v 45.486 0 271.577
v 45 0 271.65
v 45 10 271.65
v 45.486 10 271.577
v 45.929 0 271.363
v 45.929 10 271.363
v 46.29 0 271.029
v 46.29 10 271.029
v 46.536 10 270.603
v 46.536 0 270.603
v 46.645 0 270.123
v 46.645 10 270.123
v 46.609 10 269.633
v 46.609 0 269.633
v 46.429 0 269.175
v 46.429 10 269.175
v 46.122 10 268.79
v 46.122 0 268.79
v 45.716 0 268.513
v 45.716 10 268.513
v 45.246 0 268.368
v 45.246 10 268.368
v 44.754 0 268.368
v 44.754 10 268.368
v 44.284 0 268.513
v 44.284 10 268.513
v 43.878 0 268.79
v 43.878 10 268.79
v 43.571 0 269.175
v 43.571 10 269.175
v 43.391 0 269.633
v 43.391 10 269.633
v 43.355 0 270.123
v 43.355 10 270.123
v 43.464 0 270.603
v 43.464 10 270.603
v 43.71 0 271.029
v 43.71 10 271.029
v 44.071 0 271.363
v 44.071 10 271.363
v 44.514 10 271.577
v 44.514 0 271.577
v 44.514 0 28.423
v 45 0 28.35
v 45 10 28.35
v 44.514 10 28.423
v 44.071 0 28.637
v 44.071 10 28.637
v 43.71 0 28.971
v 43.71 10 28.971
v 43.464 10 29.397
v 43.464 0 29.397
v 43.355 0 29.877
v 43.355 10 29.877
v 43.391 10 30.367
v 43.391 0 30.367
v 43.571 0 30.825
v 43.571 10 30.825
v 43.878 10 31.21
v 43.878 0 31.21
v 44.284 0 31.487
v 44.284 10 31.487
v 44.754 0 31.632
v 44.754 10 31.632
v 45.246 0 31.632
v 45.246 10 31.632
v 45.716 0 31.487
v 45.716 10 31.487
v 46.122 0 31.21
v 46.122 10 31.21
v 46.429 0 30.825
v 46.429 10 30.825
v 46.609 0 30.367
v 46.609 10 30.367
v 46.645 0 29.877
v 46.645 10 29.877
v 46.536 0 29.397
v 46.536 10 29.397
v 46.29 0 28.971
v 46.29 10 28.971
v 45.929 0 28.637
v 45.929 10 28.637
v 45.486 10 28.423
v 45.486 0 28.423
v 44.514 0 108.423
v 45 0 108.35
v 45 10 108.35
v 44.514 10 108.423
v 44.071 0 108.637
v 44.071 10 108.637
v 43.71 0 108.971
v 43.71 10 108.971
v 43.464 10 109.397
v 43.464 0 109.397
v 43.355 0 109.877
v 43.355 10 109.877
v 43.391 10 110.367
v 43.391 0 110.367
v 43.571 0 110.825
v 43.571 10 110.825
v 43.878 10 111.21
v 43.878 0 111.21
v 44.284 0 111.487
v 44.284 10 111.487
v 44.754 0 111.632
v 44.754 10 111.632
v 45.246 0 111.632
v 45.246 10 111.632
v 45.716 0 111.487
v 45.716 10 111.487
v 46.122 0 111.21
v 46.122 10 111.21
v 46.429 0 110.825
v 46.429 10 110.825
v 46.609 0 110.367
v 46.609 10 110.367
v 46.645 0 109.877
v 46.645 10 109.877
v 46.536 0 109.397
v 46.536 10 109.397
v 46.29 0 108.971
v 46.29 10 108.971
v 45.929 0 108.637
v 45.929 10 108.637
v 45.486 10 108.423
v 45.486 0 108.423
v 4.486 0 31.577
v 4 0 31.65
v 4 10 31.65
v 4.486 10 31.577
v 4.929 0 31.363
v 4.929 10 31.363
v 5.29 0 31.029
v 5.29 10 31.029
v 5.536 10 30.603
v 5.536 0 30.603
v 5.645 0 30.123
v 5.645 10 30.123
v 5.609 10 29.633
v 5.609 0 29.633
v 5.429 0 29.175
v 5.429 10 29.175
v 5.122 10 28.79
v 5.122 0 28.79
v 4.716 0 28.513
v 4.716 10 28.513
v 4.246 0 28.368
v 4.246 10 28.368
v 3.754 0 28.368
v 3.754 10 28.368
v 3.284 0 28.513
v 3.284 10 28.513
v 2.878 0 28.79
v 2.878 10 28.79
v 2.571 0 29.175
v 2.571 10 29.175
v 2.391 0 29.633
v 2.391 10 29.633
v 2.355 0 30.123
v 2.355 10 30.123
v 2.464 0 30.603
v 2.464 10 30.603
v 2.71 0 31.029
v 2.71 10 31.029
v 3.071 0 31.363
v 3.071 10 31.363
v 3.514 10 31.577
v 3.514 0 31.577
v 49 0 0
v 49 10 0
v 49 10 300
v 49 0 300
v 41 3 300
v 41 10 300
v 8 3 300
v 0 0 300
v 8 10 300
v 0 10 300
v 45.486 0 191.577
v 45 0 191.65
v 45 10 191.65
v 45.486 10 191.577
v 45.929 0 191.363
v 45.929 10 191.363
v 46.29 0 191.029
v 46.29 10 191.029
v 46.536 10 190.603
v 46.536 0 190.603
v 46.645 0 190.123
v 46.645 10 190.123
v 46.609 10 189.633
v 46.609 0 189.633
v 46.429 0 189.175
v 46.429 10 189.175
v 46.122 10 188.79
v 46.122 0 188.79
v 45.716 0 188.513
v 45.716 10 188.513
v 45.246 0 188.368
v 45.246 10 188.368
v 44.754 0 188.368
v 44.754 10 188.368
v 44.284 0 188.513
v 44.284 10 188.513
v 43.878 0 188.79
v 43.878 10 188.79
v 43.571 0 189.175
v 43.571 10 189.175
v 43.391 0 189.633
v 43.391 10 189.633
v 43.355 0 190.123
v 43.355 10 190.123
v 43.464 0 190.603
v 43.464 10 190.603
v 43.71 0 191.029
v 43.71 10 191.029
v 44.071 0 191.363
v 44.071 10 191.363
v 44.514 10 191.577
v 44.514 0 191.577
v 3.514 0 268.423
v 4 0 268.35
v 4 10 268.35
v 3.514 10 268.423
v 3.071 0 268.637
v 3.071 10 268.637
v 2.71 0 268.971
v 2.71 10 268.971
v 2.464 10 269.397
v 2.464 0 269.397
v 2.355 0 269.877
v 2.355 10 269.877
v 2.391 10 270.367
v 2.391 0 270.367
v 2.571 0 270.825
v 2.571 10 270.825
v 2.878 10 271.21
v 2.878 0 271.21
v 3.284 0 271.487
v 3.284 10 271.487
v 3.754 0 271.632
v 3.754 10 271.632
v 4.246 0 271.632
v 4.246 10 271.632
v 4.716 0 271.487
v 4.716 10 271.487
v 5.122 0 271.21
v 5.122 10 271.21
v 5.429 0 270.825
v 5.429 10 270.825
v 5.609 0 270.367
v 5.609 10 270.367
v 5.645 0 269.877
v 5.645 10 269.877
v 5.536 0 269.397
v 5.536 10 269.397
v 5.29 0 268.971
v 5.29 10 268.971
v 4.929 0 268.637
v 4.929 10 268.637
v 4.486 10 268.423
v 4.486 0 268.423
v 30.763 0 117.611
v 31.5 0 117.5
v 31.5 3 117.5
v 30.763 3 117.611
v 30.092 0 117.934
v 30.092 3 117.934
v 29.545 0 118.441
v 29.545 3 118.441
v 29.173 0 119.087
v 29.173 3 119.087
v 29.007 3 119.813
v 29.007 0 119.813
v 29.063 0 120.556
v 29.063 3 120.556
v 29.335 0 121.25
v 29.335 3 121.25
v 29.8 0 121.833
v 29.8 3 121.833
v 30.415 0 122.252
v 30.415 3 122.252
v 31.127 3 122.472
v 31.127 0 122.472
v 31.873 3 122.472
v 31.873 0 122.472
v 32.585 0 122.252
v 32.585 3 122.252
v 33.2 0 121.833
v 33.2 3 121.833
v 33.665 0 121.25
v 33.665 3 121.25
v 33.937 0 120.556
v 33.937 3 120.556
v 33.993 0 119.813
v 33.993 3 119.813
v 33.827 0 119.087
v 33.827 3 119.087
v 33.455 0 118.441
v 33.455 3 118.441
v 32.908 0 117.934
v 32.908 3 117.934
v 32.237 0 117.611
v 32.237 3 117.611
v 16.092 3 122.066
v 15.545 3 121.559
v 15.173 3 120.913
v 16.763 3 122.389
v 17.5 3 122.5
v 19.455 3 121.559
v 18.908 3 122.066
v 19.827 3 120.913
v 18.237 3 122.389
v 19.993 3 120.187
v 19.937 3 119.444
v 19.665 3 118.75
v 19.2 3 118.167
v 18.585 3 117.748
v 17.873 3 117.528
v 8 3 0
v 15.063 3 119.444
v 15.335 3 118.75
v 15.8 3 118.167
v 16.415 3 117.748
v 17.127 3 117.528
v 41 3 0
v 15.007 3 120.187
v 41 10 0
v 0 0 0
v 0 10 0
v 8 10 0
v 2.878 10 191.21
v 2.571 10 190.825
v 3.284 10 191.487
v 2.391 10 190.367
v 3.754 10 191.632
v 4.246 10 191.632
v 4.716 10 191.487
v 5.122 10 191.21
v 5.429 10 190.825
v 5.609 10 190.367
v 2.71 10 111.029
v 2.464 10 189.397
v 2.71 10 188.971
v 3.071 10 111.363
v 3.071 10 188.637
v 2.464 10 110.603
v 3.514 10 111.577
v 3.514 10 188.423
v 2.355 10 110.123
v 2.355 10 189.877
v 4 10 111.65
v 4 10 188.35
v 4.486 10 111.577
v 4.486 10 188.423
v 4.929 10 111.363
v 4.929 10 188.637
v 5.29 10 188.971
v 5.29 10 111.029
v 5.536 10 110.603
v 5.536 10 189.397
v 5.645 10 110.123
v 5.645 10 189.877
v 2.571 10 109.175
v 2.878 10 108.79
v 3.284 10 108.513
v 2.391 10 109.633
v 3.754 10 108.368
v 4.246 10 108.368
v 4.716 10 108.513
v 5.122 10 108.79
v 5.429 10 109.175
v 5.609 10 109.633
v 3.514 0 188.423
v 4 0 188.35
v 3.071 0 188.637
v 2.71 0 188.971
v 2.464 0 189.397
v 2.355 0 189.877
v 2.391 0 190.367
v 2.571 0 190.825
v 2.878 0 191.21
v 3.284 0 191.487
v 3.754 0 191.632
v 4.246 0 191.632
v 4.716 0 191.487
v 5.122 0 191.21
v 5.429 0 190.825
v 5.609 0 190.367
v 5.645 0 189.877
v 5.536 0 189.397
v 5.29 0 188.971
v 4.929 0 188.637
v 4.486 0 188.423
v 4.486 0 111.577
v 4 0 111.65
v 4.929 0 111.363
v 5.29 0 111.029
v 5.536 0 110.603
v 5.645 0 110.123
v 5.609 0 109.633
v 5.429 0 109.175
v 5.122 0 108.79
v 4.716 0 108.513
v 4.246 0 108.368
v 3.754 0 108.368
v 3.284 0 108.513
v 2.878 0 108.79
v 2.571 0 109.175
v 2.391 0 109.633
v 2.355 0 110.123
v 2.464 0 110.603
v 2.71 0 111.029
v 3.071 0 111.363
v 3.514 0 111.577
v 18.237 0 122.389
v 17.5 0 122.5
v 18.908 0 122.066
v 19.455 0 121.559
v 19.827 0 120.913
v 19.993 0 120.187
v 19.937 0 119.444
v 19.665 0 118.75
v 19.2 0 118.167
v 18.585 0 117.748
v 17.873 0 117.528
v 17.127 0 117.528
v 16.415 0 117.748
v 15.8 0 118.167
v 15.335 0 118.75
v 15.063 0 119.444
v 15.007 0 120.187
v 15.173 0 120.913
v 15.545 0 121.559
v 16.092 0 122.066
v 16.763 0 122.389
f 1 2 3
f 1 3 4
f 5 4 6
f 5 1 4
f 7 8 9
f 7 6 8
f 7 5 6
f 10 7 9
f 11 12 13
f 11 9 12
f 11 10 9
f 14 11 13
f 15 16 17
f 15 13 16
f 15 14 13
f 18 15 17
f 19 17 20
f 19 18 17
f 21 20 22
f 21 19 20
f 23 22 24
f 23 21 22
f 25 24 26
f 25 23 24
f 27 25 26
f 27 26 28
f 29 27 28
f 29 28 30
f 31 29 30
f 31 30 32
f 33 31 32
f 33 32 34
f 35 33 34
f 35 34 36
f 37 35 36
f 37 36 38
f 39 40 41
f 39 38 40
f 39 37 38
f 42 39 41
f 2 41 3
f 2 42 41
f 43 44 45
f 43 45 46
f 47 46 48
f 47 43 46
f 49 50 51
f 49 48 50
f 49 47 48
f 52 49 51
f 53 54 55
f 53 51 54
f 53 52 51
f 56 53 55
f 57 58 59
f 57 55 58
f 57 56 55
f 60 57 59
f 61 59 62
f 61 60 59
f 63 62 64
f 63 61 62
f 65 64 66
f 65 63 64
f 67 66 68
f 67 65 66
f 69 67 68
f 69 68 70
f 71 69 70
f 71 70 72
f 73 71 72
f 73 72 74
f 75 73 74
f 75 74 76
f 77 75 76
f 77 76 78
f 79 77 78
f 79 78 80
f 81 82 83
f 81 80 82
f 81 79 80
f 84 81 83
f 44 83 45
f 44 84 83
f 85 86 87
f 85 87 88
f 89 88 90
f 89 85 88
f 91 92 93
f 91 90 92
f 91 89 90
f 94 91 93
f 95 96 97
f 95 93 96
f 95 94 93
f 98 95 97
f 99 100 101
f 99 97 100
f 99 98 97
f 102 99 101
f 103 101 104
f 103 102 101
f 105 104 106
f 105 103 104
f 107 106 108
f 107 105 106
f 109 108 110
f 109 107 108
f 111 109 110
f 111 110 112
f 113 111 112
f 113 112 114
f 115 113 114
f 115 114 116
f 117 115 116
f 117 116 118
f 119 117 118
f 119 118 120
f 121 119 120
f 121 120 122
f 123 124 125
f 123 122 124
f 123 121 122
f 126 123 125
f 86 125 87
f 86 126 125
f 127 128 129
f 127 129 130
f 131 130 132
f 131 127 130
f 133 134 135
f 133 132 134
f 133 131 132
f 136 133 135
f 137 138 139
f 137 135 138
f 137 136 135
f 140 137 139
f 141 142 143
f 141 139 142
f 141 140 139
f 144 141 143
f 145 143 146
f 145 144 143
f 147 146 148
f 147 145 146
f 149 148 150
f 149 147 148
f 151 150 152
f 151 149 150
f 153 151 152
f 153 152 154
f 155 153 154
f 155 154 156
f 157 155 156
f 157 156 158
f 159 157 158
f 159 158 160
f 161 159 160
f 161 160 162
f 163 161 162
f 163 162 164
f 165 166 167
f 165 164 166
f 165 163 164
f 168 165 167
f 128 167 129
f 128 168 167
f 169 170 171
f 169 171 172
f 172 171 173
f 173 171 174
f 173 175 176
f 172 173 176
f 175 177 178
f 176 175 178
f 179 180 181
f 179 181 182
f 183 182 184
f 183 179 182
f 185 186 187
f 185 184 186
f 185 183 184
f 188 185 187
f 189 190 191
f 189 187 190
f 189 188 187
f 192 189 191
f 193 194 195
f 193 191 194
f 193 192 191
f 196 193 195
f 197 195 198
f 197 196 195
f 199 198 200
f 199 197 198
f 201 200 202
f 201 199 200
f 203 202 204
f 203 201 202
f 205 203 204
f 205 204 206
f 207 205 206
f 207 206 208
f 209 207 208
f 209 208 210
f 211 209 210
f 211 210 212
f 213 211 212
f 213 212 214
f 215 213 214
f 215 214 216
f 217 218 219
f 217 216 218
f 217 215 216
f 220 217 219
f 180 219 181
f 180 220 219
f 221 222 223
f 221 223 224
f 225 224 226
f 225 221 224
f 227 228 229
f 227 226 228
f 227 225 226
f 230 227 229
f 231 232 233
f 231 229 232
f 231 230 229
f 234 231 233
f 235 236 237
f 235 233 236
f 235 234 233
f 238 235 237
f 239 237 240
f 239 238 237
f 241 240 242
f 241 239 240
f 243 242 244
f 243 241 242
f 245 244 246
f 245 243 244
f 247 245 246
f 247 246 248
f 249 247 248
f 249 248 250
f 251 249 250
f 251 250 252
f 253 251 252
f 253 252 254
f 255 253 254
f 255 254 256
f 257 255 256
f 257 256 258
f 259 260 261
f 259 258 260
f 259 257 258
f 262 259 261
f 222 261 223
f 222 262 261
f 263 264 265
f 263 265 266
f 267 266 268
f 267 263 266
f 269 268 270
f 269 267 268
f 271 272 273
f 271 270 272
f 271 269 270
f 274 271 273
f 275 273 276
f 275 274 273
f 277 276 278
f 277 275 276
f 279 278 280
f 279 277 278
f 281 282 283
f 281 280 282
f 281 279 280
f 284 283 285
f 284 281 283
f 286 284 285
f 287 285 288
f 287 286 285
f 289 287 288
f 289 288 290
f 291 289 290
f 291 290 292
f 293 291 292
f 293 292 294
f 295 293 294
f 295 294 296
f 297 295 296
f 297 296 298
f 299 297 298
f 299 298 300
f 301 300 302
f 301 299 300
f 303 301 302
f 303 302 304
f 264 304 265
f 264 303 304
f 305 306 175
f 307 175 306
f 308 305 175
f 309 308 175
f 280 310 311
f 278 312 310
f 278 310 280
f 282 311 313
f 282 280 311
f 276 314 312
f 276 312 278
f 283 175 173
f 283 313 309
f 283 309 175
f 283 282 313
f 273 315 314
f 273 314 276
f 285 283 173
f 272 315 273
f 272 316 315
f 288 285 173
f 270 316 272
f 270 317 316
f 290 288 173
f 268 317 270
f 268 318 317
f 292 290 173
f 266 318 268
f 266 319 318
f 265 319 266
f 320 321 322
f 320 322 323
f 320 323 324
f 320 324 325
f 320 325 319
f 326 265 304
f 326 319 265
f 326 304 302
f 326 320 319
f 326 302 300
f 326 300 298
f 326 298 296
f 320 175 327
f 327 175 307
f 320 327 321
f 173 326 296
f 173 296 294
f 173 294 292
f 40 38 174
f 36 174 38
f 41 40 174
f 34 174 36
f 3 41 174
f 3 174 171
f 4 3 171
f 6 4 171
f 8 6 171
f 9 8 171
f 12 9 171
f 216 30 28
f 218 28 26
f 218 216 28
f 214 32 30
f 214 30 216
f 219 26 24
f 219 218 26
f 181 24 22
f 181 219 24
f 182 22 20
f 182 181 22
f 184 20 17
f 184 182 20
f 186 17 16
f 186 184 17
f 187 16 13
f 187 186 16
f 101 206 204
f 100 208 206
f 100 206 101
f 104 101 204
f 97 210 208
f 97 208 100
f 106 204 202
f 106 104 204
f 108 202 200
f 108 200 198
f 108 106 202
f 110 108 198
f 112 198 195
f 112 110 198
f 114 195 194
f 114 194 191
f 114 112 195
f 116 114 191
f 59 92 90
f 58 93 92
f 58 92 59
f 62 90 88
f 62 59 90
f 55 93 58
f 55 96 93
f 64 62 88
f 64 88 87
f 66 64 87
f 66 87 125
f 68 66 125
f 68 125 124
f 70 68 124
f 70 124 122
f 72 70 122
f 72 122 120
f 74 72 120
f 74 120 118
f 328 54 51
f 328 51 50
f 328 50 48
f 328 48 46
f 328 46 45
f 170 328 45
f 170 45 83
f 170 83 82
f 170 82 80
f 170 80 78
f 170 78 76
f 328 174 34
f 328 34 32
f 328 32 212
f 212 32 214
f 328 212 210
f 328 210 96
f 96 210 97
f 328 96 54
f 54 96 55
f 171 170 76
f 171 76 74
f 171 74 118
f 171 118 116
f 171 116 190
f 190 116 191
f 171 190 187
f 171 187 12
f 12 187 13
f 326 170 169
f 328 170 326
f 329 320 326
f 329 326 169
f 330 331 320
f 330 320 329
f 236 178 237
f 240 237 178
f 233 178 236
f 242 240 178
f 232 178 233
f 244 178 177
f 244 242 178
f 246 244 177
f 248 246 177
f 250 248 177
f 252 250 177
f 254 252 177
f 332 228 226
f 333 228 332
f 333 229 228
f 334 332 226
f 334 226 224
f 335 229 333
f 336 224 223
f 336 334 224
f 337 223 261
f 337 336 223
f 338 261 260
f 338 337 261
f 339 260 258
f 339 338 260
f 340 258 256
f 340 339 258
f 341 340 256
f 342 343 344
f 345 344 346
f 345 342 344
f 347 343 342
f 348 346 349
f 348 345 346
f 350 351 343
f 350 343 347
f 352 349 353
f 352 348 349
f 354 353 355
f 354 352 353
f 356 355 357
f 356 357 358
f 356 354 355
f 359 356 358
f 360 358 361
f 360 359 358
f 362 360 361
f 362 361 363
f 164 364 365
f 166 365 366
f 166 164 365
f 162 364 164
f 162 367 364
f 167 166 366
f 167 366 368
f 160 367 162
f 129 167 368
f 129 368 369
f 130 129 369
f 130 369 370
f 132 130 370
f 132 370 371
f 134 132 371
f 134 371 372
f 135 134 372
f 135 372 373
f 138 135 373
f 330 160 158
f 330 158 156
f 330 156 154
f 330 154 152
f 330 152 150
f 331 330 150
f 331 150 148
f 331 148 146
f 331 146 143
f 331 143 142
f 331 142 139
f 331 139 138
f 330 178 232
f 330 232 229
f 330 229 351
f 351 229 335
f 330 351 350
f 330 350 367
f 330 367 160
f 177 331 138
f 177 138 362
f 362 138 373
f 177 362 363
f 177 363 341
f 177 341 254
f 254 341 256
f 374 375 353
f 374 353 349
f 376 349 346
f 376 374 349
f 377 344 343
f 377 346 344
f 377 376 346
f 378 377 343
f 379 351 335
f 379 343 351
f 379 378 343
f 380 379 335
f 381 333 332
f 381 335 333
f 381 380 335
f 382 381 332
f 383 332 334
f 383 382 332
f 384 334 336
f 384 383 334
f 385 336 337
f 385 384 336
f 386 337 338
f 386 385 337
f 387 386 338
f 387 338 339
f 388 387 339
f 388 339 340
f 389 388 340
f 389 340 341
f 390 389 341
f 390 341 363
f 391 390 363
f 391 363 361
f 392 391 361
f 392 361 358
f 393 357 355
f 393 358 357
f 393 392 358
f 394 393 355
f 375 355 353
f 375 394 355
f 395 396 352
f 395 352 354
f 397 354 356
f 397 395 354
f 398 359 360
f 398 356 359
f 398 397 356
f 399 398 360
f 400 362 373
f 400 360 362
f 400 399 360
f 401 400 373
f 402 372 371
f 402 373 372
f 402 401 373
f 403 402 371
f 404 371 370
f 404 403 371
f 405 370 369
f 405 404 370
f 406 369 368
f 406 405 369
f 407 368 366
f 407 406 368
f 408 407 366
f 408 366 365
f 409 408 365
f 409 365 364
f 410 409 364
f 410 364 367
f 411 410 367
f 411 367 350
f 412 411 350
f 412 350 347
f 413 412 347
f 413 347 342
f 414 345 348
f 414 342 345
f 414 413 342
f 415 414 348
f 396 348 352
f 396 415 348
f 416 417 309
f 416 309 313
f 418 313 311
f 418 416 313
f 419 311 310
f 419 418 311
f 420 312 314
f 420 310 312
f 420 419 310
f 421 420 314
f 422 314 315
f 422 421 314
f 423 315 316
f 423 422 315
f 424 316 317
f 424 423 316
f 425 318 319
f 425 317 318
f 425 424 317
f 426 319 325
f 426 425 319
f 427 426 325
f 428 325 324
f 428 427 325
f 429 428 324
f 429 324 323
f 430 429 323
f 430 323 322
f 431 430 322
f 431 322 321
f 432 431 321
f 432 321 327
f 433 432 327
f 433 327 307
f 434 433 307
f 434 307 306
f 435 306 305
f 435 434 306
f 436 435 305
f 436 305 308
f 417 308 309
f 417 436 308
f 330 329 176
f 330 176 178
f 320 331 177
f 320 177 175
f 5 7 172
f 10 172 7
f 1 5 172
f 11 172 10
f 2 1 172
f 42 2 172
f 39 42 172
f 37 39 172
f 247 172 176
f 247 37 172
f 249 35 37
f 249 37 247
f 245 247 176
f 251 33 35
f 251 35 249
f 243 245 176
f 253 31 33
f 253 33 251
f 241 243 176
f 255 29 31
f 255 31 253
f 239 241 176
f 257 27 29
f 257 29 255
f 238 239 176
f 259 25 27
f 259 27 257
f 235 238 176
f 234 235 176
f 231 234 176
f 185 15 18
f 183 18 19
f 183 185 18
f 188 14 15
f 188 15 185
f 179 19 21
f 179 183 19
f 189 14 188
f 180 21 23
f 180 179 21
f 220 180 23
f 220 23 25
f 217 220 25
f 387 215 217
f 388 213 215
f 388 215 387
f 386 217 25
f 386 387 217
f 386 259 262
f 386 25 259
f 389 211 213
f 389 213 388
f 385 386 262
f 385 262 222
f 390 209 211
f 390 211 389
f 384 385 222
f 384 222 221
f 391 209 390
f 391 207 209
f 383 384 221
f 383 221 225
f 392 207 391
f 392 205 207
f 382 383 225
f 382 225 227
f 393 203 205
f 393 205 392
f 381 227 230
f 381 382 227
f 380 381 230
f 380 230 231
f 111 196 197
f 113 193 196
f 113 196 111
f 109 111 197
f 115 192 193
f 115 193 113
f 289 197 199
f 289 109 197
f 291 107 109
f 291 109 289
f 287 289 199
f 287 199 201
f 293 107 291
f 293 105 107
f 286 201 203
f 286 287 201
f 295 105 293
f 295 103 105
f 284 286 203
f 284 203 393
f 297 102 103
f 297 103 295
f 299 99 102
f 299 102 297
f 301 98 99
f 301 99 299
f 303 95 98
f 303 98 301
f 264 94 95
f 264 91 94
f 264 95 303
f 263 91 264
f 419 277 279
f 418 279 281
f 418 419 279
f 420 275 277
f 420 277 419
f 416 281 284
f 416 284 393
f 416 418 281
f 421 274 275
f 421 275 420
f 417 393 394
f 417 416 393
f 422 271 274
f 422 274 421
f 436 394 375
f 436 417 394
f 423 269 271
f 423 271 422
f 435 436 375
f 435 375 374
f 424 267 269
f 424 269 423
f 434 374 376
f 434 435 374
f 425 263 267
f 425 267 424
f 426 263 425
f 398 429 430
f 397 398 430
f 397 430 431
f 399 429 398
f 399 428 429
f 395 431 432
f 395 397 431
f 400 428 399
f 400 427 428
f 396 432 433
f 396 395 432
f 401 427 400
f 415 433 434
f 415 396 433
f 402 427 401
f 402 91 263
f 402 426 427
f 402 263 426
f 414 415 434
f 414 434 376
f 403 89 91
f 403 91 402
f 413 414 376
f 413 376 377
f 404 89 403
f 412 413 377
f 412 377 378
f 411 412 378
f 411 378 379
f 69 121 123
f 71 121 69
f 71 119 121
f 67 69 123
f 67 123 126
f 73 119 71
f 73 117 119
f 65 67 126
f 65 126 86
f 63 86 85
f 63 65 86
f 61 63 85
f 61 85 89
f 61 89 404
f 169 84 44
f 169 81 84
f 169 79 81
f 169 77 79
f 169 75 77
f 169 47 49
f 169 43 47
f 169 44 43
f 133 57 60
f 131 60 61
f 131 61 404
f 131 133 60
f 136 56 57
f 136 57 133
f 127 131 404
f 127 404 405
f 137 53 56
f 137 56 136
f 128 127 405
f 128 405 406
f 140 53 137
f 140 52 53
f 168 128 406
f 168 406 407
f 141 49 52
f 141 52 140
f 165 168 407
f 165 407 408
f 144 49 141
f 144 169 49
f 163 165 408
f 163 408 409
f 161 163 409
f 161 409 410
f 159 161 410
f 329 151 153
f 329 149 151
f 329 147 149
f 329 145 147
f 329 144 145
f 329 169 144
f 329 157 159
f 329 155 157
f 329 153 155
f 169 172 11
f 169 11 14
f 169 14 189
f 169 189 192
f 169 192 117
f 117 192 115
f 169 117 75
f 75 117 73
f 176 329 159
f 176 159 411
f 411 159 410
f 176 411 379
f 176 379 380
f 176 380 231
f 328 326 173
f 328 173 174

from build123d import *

# Parameters (mm, degrees)
BOSS_EXTRU_1_DEPTH           = 300
ENL_V_MAT_EXTRU_1_DEPTH      = 305.05591591
ENL_V_MAT_EXTRU_1_DEPTH_BACK = 305.05591591
ESQUISSE2_R                  = 2.5
ENL_V_MAT_EXTRU_2_DEPTH      = 305.1397705
ENL_V_MAT_EXTRU_2_DEPTH_BACK = 305.1397705
ESQUISSE3_R                  = 1.65


with BuildPart() as part:
    # Esquisse1 → Boss.-Extru.1 (new body)
    with BuildSketch(Plane.XY):
        Polygon((0, 0), (0, 10), (8, 10), (8, 3), (41, 3), (41, 10), (49, 10), (49, 0), align=None)
    extrude(amount=BOSS_EXTRU_1_DEPTH)

    # Esquisse2 → Enlèv. mat.-Extru.1 (cut, two sides: drawn at the far end of the back side and taken through both)
    with BuildSketch(Plane(origin=(0, 3, 0), x_dir=(1, 0, 0), z_dir=(0, 1, 0)).offset(-ENL_V_MAT_EXTRU_1_DEPTH_BACK)):
        with Locations(Location((17.5, -120, 0), (0, 0, 270))):
            Circle(ESQUISSE2_R)
        with Locations(Location((31.5, -120, 0), (0, 0, 90))):
            Circle(ESQUISSE2_R)
    extrude(amount=ENL_V_MAT_EXTRU_1_DEPTH + ENL_V_MAT_EXTRU_1_DEPTH_BACK, mode=Mode.SUBTRACT)

    # Esquisse3 → Enlèv. mat.-Extru.2 (cut, two sides: drawn at the far end of the back side and taken through both)
    with BuildSketch(Plane(origin=(0, 10, 0), x_dir=(1, 0, 0), z_dir=(0, 1, 0)).offset(-ENL_V_MAT_EXTRU_2_DEPTH_BACK)):
        with Locations(Location((45, -270, 0), (0, 0, 270))):
            Circle(ESQUISSE3_R)
        with Locations(Location((45, -190, 0), (0, 0, 270))):
            Circle(ESQUISSE3_R)
        with Locations(Location((45, -110, 0), (0, 0, 90))):
            Circle(ESQUISSE3_R)
        with Locations(Location((45, -30, 0), (0, 0, 90))):
            Circle(ESQUISSE3_R)
        with Locations(Location((4, -30, 0), (0, 0, 270))):
            Circle(ESQUISSE3_R)
        with Locations(Location((4, -110, 0), (0, 0, 270))):
            Circle(ESQUISSE3_R)
        with Locations(Location((4, -190, 0), (0, 0, 90))):
            Circle(ESQUISSE3_R)
        with Locations(Location((4, -270, 0), (0, 0, 90))):
            Circle(ESQUISSE3_R)
    extrude(amount=ENL_V_MAT_EXTRU_2_DEPTH + ENL_V_MAT_EXTRU_2_DEPTH_BACK, mode=Mode.SUBTRACT)


solid = part.part
